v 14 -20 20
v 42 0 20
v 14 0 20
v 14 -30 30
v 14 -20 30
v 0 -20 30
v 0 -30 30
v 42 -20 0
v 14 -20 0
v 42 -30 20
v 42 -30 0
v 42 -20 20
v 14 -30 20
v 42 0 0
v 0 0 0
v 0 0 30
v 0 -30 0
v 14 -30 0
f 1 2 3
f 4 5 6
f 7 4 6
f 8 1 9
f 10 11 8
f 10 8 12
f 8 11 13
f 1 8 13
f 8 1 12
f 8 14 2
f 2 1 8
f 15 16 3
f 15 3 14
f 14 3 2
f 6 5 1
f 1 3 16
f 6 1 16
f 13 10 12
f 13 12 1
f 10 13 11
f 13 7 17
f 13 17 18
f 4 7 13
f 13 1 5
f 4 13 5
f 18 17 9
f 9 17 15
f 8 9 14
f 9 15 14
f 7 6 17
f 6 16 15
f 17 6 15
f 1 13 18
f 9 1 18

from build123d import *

# Parameters (mm, degrees)
F1_DEPTH  = 30
F3_DEPTH  = 20
F5_DEPTH  = 10
F8_DEPTH  = 25.2477497707
F9_DEPTH  = 10
F10_DEPTH = 10


with BuildPart() as f1:
    # F0 (on Front) → F1 (new body)
    with BuildSketch(Plane.XZ):
        Polygon((0, 30), (0, 0), (42, 0), (42, 20), (14, 20), (14, 30), align=None)
    extrude(amount=F1_DEPTH)

    # F2 (on face) → F3 (cut)
    with BuildSketch(Plane(origin=(0, 0, 0), x_dir=(-1, 0, 0), z_dir=(0, 1, 0))):
        Polygon((-14, 20), (0, 30), (-14, 30), align=None)
    extrude(amount=-F3_DEPTH, mode=Mode.SUBTRACT)

    # F4 (on face) → F5 (cut)
    with BuildSketch(Plane.XZ.offset(30)):
        Polygon((42, 20), (14, 20), (42, 0), align=None)
    extrude(amount=-F5_DEPTH, mode=Mode.SUBTRACT)

    # F7 (on 3pt) → F8 (cut, through all)
    with BuildSketch(Plane(origin=(14.2276422764, -19.918699187, 19.918699187), x_dir=(0.8926073983, 0.3187883565, -0.3187883565), z_dir=(0.4508348173, -0.6311687443, 0.6311687443))):
        Polygon((31.1137435975, 14.1421356237), (-0.2550306852, 0), (31.1137435975, -14.1421356237), align=None)
    extrude(amount=F8_DEPTH, mode=Mode.SUBTRACT)

    # F4 (on face) → F9 (join, through all)
    with BuildSketch(Plane.XZ.offset(30)):
        Polygon((42, 20), (14, 20), (42, 0), align=None)
    extrude(amount=-F9_DEPTH)

    # F4 (on face) → F10 (cut, through all)
    with BuildSketch(Plane.XZ.offset(30)):
        Polygon((42, 0), (14, 20), (14, 0), align=None)
    extrude(amount=-F10_DEPTH, mode=Mode.SUBTRACT)


solid = f1.part
